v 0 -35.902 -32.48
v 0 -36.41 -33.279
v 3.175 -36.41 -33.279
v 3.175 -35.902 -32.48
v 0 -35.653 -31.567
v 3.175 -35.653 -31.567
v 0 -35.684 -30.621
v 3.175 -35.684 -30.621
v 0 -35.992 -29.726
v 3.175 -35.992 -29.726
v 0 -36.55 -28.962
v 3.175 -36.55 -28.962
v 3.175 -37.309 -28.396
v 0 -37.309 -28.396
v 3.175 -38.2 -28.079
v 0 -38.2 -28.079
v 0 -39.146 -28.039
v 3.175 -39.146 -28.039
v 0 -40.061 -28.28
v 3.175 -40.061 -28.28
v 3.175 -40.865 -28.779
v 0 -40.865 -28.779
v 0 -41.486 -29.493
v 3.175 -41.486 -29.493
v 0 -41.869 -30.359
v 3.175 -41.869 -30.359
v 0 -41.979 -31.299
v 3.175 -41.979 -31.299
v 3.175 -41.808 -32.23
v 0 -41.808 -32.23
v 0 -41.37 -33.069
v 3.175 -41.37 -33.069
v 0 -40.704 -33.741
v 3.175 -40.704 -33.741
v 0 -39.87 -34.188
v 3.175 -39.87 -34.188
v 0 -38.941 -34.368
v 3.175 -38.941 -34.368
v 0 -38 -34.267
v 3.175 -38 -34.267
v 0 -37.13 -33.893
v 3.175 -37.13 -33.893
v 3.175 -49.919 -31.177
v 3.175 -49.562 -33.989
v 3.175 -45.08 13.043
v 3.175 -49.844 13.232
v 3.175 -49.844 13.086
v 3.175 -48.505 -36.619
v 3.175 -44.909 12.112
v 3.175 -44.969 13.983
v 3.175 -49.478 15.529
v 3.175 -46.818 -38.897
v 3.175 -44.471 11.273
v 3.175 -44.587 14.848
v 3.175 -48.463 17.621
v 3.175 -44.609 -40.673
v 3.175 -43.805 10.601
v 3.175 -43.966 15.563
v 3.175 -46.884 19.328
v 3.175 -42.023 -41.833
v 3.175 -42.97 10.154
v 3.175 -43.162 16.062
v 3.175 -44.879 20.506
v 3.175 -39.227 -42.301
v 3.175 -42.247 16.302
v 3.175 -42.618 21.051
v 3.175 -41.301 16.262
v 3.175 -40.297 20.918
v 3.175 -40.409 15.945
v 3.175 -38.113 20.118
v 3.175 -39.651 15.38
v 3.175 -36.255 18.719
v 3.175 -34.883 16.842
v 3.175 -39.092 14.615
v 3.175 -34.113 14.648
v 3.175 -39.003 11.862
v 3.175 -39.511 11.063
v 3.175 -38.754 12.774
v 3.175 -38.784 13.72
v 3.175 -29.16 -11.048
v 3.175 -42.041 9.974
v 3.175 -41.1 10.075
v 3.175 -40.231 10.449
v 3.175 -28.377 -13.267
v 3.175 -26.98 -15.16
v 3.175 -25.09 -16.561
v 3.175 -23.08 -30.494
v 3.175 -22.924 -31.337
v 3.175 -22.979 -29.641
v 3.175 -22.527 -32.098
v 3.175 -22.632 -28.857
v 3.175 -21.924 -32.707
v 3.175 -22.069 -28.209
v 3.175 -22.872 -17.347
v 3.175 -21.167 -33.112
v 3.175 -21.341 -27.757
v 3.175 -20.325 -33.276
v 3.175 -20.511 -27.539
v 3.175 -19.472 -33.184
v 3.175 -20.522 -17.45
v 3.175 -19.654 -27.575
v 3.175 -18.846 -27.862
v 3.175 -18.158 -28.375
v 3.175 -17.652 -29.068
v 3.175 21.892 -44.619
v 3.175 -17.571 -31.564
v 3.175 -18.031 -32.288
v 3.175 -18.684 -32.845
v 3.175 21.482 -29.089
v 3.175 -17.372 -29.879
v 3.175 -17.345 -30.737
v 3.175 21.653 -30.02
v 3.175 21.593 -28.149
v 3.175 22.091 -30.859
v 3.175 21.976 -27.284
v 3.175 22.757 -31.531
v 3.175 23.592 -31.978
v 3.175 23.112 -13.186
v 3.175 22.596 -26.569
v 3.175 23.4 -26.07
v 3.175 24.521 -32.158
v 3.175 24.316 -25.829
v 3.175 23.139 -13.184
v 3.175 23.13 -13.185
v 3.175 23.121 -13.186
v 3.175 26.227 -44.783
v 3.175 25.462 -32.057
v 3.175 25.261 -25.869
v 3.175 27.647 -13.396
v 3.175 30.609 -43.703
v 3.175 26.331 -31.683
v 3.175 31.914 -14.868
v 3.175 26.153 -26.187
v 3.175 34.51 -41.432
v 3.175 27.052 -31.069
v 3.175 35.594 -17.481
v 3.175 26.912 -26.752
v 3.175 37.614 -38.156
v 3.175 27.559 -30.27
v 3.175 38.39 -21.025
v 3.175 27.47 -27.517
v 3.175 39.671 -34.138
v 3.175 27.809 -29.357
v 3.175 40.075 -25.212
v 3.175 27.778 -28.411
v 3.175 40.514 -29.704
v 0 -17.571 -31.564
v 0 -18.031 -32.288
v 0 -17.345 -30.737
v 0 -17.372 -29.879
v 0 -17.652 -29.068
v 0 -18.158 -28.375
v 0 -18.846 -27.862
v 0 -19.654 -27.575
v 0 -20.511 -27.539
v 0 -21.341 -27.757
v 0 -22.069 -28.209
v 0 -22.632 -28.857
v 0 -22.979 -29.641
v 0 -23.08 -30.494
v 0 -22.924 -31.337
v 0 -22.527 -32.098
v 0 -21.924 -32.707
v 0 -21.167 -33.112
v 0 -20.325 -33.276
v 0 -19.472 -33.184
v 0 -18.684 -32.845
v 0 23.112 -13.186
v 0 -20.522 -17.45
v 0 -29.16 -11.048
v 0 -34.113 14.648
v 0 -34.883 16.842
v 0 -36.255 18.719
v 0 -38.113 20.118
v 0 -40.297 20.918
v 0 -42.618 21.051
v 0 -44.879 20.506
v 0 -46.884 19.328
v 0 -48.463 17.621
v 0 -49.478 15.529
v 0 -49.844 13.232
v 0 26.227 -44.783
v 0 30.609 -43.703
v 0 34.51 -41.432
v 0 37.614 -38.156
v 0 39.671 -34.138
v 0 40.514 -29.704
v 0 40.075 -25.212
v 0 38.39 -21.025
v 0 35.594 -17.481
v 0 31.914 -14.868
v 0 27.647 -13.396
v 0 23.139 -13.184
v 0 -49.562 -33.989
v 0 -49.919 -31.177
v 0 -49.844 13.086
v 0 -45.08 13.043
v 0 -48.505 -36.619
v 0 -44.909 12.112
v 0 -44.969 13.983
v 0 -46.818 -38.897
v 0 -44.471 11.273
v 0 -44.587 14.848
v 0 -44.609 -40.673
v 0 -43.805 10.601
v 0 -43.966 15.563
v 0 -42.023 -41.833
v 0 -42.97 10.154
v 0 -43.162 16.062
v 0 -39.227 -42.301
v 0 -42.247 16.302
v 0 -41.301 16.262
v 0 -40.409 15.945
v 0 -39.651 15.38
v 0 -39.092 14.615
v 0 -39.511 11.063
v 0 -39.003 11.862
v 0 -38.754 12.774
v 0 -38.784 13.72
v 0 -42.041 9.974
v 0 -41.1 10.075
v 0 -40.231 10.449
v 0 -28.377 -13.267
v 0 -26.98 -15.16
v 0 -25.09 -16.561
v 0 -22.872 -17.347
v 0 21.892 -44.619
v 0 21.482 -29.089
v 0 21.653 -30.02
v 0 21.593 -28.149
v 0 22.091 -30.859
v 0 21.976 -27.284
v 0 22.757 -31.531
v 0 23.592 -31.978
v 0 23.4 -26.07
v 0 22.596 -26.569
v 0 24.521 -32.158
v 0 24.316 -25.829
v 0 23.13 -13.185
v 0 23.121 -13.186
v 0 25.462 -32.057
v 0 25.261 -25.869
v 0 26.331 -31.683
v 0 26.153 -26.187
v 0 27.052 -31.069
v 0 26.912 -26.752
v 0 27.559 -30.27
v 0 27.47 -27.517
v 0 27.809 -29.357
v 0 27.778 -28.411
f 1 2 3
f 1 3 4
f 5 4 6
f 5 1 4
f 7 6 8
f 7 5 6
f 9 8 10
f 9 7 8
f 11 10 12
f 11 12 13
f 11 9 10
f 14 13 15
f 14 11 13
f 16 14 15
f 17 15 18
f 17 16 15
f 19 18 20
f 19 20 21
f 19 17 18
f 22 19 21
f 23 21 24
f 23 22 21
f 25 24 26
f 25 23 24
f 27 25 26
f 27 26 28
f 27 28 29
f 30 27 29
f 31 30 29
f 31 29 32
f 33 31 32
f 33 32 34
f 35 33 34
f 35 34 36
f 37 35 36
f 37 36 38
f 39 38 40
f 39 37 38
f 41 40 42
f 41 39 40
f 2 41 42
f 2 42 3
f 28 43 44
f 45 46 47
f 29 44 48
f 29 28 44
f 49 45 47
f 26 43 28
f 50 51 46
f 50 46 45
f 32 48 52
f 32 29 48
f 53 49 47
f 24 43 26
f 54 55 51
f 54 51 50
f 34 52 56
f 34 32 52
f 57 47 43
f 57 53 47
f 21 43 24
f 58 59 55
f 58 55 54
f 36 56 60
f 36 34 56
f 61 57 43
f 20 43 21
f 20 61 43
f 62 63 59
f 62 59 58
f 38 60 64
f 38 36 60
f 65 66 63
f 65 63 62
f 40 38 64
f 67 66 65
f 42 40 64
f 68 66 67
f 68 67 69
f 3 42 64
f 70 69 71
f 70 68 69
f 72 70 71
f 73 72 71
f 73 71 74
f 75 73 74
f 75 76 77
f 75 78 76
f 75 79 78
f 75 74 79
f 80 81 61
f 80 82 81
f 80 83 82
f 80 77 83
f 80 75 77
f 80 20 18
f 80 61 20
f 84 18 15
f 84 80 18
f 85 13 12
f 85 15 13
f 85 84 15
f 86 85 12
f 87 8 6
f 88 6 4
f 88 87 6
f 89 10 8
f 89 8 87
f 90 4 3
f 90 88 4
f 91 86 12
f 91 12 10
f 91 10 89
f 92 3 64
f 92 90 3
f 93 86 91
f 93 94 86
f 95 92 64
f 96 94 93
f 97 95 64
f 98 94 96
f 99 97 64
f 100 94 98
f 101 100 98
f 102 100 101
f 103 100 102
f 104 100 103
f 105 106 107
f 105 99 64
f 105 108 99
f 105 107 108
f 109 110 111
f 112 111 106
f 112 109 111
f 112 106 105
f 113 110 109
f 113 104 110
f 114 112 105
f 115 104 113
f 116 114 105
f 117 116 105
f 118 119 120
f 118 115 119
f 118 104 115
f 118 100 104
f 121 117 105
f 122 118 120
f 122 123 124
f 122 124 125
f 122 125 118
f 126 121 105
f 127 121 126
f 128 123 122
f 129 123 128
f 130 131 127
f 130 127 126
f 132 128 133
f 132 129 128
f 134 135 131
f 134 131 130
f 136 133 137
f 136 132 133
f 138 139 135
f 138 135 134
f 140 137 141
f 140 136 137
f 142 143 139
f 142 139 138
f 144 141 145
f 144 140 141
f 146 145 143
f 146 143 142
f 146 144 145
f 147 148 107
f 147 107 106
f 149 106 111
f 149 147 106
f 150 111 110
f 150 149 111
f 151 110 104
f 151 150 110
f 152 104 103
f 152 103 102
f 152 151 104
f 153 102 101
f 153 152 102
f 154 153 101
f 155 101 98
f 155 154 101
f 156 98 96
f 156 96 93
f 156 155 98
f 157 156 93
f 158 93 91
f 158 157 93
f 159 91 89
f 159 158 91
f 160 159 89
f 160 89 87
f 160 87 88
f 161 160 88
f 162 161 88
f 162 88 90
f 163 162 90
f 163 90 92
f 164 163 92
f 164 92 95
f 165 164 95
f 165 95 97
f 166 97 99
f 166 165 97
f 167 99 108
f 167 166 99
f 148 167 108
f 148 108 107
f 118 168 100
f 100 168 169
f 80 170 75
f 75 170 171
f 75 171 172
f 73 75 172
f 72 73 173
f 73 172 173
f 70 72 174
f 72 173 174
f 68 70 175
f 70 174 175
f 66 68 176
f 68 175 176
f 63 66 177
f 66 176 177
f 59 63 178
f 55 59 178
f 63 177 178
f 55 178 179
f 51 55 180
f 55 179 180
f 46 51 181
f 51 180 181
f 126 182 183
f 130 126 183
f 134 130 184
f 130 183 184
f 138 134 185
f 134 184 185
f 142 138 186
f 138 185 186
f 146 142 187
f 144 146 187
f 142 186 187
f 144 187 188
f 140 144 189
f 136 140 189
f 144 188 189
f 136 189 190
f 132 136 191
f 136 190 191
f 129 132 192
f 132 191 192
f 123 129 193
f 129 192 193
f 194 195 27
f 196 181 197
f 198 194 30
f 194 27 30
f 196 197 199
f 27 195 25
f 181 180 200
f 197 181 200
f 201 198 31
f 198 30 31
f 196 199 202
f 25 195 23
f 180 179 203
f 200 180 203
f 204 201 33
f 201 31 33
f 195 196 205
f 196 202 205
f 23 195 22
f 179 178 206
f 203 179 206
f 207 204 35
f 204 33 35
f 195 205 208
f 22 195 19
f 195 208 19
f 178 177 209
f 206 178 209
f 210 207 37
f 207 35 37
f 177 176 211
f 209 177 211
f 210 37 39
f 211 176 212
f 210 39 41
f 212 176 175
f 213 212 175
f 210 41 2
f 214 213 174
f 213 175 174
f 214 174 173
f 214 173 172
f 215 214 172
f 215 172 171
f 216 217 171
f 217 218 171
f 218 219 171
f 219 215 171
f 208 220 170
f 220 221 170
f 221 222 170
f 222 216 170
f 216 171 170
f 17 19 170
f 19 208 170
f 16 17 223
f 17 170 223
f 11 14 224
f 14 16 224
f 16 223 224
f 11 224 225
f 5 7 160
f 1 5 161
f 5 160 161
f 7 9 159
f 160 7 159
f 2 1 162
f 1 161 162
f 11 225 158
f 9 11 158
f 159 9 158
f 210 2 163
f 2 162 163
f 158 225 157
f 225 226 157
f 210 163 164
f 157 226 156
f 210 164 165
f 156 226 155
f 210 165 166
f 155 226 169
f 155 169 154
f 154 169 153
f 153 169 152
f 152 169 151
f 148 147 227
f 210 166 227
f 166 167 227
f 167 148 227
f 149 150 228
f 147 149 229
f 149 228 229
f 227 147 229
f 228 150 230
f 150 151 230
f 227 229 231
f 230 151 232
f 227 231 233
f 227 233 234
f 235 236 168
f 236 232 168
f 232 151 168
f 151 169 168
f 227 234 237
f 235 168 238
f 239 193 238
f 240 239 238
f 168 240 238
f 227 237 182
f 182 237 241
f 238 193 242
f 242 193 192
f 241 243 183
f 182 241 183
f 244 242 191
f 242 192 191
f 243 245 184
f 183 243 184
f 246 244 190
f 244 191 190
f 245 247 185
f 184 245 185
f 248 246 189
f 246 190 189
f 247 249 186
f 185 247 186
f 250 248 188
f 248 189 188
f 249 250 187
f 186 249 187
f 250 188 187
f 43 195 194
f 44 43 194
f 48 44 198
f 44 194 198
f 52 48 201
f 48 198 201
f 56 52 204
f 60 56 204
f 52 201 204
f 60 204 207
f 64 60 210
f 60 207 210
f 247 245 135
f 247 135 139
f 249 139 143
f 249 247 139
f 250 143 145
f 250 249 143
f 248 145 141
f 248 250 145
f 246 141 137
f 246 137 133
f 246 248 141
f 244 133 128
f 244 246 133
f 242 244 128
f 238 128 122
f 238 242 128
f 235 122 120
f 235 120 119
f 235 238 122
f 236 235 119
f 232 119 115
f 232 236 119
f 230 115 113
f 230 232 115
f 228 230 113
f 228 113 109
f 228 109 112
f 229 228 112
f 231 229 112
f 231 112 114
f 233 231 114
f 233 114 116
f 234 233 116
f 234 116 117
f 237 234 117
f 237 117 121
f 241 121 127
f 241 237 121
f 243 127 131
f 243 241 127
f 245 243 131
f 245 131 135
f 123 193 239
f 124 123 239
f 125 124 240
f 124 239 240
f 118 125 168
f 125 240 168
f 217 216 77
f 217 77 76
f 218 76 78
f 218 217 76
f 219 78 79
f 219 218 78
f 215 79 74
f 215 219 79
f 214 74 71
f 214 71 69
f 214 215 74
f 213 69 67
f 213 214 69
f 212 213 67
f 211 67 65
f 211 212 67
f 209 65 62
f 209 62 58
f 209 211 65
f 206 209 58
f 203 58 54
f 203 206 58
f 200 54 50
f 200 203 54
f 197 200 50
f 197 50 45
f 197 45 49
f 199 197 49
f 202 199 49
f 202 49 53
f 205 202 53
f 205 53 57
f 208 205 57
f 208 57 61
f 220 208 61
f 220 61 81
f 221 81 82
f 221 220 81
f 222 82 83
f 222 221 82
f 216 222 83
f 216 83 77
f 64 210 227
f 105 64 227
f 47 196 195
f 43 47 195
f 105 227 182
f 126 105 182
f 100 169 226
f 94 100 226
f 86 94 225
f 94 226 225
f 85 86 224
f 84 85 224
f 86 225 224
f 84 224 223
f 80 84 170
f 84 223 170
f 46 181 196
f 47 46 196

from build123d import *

# Parameters (mm, degrees)
F0_R     = 3.175
F0_R_2   = 2.878099
F1_DEPTH = 3.175
F3_ANGLE = 41


with BuildPart() as f1:
    # F0 (on Right) → F1 (new body)
    with BuildSketch(Plane.YZ):
        with BuildLine():
            Line((-0.683293, -22.206229), (-21.279692, -6.062372))
            ThreePointArc((-21.279692, -6.062372), (-31.89988, -6.809987), (-32.223099, -17.45155))
            Line((-32.223099, -17.45155), (-32.127586, -17.5618))
            Line((-32.127586, -17.5618), (-3.144408, -51.016742))
            ThreePointArc((-3.144408, -51.016742), (4.260096, -54.808331), (12.221904, -52.397431))
            Line((12.221904, -52.397431), (59.870195, -14.049133))
            Line((59.870195, -14.049133), (63.249417, -11.329467))
            ThreePointArc((63.249417, -11.329467), (62.611086, 11.0927), (40.187851, 10.493082))
            ThreePointArc((40.187851, 10.493082), (40.178419, 10.48314), (40.168995, 10.47319))
            Line((40.168995, 10.47319), (10.036033, -21.370629))
            ThreePointArc((10.036033, -21.370629), (4.839042, -23.875239), (-0.683293, -22.206229))
        make_face()
        with Locations((5.254567, -43.740418)):
            Circle(F0_R, mode=Mode.SUBTRACT)
        with Locations((18.772386, -30.935138)):
            Circle(F0_R_2, mode=Mode.SUBTRACT)
        with Locations((-26.176328, -12.30952)):
            Circle(F0_R, mode=Mode.SUBTRACT)
        with Locations((51.699796, -0.4381)):
            Circle(F0_R, mode=Mode.SUBTRACT)
    extrude(amount=F1_DEPTH)


with BuildPart() as f1_1:
    # F3: moved
    add(f1.part.rotate(Axis((-5.653633, 0, 21.454556), (-1, 0, 0)), F3_ANGLE))


solid = f1_1.part
